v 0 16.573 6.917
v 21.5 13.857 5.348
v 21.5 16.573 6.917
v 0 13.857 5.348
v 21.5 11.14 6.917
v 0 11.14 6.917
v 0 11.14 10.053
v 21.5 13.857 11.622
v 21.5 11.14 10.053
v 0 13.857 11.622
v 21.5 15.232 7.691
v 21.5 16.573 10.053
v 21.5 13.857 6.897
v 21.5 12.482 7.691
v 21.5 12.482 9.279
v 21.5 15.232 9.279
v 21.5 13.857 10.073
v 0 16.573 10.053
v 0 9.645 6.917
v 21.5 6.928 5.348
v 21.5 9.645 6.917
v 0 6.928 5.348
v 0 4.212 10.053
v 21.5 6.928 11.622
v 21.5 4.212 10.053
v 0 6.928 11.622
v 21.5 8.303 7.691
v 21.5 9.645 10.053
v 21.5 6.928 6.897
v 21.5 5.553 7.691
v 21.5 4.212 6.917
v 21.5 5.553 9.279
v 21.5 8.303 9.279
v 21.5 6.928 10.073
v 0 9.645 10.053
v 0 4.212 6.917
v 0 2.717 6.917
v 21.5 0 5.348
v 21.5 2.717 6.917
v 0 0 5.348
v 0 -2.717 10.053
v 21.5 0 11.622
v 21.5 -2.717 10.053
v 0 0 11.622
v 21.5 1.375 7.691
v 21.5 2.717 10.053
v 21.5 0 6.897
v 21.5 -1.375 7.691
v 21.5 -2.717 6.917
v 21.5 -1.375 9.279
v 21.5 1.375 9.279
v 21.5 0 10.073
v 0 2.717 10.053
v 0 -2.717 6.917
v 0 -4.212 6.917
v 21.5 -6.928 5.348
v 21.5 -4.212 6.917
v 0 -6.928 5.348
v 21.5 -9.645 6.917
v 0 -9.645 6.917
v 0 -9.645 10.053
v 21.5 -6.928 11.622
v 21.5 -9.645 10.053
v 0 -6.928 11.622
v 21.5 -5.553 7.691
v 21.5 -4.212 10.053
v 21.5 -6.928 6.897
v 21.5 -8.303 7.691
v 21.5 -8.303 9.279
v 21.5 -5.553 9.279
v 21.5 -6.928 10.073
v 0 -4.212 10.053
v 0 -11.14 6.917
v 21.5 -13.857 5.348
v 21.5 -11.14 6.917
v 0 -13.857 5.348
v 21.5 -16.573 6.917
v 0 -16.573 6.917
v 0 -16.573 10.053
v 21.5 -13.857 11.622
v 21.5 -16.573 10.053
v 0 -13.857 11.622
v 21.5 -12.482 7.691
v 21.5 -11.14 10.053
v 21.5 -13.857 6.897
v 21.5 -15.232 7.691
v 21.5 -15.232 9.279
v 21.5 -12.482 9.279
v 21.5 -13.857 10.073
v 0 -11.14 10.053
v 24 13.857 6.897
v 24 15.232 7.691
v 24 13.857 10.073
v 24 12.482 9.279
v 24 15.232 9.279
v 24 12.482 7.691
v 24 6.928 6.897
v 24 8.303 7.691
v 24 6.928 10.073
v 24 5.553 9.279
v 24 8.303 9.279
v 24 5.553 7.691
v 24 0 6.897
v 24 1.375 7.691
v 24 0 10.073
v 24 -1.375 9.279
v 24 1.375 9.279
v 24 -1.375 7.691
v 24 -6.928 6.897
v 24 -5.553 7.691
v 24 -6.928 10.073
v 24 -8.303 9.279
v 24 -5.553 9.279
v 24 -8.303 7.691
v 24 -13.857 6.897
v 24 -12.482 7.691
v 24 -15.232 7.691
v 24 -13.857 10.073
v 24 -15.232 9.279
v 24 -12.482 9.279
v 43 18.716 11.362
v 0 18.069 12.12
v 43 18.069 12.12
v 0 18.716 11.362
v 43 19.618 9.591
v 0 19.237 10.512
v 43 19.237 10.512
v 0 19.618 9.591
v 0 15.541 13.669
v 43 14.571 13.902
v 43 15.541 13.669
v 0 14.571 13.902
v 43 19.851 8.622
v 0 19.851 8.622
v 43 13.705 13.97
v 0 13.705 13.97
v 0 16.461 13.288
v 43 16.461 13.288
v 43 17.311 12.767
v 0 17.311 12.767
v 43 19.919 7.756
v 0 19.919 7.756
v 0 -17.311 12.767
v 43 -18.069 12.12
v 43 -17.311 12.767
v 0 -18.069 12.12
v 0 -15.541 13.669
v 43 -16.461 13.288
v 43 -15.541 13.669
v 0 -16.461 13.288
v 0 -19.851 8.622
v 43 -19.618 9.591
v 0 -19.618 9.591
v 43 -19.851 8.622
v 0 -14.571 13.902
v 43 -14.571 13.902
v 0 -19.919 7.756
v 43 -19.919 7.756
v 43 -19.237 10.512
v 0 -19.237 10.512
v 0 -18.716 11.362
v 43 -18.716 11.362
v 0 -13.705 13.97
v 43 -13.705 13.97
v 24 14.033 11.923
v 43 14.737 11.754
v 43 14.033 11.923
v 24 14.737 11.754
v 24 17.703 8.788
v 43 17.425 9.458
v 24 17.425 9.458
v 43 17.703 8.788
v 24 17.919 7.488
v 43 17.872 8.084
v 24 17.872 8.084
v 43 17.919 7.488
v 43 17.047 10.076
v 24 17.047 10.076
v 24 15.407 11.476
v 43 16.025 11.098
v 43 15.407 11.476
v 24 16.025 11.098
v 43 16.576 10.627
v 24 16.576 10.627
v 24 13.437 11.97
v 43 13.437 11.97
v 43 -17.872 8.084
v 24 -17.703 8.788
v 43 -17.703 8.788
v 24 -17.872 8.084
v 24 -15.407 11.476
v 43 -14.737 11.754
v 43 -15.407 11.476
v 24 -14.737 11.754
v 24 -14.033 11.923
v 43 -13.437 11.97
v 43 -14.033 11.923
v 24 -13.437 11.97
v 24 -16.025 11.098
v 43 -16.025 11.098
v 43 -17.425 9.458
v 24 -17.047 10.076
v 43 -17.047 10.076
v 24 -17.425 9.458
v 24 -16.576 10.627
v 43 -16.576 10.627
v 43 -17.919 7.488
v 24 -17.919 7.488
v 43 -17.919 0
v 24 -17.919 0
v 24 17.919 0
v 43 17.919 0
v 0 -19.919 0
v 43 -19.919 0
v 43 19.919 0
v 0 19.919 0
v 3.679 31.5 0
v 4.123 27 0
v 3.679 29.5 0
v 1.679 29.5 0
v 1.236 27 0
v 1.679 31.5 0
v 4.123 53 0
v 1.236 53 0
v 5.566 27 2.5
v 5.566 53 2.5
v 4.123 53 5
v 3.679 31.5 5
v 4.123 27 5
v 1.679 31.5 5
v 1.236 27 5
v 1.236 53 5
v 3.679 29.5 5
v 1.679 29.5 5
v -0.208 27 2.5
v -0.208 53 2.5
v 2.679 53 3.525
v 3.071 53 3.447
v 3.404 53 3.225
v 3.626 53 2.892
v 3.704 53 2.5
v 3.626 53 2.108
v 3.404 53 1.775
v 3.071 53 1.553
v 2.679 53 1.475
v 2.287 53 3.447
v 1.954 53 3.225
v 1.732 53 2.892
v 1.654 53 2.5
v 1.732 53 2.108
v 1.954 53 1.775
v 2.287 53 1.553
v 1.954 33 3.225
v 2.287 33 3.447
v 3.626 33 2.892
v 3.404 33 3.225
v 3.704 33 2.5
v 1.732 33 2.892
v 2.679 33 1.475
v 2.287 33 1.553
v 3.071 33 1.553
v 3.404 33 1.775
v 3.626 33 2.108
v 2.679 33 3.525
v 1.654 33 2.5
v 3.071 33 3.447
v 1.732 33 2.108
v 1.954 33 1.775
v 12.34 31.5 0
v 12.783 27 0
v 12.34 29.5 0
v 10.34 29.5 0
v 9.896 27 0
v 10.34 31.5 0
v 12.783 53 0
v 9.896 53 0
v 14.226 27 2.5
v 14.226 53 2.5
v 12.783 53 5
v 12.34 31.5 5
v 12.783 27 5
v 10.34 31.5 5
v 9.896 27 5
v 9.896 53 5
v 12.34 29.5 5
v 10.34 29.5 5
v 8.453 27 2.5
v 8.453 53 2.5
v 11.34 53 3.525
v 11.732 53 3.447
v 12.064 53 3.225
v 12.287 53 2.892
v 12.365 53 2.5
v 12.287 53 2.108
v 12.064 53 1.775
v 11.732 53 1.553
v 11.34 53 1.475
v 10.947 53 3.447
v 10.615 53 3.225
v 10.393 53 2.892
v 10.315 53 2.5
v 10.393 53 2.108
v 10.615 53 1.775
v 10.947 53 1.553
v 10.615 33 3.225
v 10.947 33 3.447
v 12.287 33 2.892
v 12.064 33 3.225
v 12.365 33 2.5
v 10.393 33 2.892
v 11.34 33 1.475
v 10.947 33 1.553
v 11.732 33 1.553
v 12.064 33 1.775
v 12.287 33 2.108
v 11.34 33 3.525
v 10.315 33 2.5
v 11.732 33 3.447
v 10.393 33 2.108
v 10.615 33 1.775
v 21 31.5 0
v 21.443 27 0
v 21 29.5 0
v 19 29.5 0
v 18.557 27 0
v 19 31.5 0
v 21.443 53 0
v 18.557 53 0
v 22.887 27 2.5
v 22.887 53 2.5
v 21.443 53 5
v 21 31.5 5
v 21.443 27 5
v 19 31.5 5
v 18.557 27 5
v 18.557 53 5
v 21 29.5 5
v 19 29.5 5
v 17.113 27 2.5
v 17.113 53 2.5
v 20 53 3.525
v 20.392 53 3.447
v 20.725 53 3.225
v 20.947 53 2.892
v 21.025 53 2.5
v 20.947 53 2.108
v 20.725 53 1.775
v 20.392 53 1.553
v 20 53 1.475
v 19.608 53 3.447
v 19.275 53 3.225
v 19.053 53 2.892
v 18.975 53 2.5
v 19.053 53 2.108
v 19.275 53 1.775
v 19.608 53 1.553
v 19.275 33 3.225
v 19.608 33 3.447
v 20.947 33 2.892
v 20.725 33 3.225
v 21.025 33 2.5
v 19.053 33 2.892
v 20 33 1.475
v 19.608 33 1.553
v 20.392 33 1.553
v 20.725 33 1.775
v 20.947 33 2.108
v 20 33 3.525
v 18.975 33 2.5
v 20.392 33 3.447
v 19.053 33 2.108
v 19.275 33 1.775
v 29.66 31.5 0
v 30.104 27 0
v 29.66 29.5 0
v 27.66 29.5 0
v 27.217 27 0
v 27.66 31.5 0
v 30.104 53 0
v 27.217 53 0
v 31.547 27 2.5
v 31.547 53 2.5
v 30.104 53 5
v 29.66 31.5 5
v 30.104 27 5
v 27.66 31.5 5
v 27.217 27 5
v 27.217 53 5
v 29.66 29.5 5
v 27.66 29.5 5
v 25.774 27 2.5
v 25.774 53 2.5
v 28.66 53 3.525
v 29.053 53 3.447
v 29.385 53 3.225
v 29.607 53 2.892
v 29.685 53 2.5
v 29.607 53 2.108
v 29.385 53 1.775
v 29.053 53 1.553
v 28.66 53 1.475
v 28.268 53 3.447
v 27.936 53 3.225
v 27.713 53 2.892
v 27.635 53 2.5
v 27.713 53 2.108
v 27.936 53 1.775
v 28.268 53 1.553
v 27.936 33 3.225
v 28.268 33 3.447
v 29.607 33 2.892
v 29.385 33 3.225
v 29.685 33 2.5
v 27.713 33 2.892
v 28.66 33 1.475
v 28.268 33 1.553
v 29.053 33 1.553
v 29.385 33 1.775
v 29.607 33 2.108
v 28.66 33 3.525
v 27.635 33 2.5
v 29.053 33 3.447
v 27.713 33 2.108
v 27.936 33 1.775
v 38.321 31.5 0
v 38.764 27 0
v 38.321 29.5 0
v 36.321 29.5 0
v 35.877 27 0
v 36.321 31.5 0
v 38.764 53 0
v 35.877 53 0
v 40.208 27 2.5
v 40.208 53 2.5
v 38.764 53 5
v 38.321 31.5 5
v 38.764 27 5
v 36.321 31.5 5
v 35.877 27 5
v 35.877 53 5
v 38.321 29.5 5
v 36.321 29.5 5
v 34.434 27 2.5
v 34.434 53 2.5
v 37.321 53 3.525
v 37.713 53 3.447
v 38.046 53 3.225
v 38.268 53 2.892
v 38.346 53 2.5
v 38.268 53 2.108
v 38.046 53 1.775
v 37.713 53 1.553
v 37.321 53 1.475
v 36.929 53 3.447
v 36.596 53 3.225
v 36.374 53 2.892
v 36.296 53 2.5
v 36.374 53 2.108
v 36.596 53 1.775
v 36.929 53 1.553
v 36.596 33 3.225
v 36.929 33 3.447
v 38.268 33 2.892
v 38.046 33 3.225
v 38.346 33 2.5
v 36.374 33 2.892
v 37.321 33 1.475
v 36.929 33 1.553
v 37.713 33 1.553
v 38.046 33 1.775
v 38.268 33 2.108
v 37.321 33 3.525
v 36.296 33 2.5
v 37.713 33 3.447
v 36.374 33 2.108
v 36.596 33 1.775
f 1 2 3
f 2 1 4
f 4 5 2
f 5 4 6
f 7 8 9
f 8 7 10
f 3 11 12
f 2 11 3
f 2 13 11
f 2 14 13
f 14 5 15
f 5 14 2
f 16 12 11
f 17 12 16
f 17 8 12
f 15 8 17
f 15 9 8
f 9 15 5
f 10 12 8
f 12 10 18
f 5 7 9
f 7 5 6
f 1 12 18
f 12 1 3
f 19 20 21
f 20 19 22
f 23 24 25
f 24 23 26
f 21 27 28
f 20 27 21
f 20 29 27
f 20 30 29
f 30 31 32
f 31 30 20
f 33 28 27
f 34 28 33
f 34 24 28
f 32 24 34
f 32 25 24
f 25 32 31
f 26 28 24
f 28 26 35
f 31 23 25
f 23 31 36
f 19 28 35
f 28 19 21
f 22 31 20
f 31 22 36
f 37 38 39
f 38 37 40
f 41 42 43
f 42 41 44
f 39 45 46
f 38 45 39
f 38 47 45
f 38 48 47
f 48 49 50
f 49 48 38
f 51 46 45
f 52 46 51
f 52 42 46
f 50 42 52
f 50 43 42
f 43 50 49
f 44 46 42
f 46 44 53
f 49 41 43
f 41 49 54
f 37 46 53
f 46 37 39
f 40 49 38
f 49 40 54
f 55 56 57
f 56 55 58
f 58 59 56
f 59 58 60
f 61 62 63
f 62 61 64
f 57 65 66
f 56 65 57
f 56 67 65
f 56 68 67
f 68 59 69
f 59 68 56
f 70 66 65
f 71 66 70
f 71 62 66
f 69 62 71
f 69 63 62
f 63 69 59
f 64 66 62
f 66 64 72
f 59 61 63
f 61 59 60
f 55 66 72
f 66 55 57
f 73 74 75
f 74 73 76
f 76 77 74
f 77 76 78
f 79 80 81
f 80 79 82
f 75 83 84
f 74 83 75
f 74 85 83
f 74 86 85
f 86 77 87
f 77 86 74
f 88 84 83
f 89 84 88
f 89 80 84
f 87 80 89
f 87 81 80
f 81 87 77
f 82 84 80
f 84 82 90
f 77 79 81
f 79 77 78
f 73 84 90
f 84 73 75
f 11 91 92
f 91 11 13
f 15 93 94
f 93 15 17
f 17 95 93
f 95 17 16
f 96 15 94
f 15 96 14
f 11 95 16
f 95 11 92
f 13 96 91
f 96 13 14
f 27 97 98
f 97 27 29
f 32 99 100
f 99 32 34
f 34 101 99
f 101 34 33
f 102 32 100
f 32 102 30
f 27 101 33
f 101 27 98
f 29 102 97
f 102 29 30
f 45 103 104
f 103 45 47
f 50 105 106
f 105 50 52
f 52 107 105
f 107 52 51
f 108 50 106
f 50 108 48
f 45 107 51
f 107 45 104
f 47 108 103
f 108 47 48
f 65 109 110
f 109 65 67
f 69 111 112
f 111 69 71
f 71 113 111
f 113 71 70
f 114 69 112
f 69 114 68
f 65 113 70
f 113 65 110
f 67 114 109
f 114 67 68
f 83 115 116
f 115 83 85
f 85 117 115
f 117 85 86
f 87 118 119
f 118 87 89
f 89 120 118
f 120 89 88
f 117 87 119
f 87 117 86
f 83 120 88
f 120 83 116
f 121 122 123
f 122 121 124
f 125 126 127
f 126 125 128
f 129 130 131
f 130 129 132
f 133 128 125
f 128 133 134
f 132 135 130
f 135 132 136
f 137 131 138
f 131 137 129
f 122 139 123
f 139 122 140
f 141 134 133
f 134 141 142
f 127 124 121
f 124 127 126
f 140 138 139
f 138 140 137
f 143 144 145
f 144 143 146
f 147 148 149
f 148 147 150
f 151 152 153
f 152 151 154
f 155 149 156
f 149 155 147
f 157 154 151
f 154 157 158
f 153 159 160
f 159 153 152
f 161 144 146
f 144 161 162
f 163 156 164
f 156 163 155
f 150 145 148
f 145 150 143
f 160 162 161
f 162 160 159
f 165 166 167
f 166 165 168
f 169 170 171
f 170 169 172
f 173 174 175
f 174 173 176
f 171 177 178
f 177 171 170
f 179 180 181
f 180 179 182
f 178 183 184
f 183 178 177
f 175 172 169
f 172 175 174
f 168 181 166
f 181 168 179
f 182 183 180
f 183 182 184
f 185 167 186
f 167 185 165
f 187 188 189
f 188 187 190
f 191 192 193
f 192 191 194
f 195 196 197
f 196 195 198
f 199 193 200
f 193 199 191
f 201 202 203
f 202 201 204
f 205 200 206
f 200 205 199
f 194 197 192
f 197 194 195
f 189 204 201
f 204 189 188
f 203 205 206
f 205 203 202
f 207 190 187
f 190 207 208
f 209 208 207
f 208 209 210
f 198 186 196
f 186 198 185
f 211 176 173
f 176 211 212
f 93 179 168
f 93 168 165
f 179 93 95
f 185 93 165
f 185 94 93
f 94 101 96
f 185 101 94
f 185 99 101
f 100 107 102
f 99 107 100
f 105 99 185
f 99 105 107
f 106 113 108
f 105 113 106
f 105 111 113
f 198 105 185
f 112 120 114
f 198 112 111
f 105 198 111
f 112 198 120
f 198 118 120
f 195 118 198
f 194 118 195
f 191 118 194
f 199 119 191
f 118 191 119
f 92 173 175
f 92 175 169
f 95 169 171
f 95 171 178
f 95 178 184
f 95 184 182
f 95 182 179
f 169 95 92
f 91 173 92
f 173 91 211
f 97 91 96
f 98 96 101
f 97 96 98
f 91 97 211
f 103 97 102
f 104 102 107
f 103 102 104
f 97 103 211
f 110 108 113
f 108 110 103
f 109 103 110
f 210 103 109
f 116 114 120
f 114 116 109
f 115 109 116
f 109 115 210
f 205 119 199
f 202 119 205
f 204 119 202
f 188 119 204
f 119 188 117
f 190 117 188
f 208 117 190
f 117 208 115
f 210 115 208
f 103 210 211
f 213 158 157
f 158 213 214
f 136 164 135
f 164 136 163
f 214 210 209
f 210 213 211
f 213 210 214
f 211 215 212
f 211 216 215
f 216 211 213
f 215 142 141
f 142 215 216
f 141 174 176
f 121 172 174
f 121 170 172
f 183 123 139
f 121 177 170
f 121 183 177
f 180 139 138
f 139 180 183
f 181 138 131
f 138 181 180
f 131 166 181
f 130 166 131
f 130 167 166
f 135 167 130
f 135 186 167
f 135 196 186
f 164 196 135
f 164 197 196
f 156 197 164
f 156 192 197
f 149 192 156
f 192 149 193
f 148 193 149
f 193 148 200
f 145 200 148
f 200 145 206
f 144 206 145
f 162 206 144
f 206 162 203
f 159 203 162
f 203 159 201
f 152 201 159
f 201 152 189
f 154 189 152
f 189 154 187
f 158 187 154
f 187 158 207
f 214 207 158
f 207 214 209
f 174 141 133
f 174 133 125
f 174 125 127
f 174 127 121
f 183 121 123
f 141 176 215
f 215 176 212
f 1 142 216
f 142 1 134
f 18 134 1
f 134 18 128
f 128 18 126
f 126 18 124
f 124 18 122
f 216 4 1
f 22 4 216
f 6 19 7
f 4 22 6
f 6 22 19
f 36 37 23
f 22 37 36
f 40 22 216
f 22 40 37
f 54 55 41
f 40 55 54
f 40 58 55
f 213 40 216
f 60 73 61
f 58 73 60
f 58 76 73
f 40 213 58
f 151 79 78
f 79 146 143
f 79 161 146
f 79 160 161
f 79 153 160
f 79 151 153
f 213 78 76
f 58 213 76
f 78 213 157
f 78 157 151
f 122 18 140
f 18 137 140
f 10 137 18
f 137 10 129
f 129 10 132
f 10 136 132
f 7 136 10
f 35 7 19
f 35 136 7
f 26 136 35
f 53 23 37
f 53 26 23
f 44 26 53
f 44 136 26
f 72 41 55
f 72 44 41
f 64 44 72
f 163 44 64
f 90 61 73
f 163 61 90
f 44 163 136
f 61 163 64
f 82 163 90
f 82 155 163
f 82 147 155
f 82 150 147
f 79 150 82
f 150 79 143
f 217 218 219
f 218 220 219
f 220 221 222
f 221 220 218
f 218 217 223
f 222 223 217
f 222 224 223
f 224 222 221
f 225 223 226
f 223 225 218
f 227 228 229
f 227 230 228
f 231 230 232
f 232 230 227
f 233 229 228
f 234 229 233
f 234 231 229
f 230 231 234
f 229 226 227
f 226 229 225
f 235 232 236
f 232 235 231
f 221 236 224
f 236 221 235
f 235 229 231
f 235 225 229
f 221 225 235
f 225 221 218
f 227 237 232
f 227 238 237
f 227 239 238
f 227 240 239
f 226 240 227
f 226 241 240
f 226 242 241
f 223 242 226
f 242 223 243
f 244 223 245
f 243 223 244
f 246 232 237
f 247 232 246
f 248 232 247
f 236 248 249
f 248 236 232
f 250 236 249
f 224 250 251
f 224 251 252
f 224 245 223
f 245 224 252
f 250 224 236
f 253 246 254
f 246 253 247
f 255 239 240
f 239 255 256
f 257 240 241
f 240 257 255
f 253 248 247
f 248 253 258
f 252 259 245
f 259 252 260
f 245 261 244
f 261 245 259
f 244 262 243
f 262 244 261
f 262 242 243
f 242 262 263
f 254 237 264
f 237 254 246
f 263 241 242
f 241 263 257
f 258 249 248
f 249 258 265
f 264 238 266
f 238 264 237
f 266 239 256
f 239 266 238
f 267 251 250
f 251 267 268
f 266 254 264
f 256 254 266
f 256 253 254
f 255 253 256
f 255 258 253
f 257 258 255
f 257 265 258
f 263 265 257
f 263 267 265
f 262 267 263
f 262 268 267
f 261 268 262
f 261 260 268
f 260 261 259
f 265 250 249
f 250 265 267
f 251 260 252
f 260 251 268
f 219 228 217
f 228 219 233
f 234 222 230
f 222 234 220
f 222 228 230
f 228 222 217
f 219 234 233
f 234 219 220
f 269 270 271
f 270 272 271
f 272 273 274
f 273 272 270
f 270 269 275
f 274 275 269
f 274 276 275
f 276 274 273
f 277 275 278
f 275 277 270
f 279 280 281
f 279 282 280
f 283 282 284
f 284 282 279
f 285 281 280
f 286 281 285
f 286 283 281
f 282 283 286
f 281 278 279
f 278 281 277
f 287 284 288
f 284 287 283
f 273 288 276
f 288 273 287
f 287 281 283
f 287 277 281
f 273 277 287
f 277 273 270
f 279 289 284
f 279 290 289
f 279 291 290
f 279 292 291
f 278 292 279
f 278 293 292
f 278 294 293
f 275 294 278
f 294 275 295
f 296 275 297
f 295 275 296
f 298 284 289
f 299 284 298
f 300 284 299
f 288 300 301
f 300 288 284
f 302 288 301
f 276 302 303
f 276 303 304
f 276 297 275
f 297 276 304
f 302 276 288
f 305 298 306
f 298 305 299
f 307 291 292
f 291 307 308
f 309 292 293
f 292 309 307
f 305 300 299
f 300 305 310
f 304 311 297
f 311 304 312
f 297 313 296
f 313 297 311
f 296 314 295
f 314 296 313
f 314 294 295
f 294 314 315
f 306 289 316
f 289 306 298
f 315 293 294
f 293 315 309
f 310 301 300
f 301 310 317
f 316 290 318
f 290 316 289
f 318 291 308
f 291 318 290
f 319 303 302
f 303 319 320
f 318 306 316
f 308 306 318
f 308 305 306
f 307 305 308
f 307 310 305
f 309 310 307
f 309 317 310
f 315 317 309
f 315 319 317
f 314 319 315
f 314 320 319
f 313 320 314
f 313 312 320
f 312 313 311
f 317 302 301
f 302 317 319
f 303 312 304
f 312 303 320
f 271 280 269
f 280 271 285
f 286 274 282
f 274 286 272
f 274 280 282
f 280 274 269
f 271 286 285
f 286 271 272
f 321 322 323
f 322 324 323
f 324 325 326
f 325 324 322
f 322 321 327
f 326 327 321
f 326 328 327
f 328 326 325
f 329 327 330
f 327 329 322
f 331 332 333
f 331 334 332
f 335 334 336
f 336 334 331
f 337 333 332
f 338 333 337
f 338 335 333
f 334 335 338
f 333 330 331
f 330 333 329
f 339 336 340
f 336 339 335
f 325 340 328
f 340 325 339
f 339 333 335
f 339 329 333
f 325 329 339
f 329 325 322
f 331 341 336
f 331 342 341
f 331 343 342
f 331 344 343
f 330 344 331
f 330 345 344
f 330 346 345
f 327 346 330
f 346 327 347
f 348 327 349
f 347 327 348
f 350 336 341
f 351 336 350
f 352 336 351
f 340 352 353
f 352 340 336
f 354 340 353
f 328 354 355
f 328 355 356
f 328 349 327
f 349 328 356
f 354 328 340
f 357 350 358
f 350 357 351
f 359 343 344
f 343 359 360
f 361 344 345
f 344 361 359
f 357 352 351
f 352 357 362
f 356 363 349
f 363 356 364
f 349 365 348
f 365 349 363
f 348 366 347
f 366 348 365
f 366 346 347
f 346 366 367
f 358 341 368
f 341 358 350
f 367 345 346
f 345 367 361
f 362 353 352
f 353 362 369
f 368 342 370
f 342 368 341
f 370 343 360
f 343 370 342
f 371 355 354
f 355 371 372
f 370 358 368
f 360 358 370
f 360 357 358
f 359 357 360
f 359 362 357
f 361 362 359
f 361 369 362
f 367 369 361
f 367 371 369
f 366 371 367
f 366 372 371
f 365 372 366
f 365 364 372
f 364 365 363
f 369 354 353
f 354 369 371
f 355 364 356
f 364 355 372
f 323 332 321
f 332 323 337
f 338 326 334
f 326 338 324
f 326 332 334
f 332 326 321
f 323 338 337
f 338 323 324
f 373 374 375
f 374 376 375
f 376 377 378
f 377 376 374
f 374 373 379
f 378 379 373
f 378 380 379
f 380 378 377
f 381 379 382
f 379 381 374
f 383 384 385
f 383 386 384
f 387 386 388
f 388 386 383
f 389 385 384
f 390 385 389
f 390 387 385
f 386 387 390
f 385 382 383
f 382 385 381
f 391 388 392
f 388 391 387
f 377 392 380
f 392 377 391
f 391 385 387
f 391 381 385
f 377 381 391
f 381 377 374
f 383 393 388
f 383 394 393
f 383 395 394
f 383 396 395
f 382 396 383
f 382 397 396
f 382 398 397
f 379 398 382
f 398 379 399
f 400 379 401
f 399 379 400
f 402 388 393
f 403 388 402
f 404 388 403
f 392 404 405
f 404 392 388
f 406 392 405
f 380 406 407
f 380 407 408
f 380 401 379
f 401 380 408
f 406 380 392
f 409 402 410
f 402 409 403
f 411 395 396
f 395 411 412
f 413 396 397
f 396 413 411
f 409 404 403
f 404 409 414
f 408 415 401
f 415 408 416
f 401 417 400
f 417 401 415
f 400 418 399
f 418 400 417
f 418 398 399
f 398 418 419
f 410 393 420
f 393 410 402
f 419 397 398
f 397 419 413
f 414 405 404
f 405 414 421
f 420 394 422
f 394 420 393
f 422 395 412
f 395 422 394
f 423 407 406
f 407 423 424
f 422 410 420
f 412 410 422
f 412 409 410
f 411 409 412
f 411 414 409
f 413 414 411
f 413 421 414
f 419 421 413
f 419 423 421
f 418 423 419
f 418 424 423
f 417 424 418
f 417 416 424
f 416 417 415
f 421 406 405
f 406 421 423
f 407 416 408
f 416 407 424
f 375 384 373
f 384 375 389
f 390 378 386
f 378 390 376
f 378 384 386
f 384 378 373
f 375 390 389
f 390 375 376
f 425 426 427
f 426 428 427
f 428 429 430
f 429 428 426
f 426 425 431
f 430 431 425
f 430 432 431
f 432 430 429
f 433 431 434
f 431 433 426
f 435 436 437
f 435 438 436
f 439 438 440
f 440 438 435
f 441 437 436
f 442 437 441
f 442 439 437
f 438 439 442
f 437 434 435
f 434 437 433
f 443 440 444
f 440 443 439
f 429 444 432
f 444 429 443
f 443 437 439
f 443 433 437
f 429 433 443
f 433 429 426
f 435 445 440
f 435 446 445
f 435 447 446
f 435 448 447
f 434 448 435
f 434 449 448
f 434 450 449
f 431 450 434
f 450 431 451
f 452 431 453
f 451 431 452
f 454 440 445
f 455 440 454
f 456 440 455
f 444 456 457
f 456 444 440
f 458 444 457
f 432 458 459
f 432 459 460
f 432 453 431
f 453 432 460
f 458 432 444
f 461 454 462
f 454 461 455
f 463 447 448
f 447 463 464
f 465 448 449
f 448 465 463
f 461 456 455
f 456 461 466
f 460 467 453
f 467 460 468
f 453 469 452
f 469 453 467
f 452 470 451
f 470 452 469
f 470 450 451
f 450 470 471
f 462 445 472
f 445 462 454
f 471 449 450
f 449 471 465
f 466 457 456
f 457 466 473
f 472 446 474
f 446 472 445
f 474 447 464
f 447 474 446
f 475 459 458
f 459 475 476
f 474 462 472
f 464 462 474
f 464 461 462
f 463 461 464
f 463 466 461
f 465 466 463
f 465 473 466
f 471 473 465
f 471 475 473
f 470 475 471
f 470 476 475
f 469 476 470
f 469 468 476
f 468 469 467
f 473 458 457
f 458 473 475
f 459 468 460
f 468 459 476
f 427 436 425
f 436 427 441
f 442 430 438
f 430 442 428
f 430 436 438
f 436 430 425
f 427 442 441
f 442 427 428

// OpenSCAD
/*

Parametric Prosthetic Hand String Tensioner
Based on a part designed by Ivan Owen
Put into parametric format by David Orgeman

Released under the terms of the GNU GPL v3.0 

This program is free software: you can redistribute it and/or modify
it under the terms of the GNU General Public License as published by
the Free Software Foundation, either version 3 of the License, or
(at your option) any later version.

This program is distributed in the hope that it will be useful,
but WITHOUT ANY WARRANTY; without even the implied warranty of
MERCHANTABILITY or FITNESS FOR A PARTICULAR PURPOSE. See the
GNU General Public License for more details.

You should have received a copy of the GNU General Public License
along with this program. If not, see <http://www.gnu.org/licenses/>.

*/


Metric_Table=[ 	["M2", 0.8000, 1.1000, 2.3094], 
				["M25", 1.0250, 1.3750, 2.8868], 
				["M3", 1.2500, 1.6500, 3.1754], 
				["M4", 1.6500, 2.2000, 4.0415], 
				["M5", 2.1000, 2.7500, 4.6188]  ];


//Standard hole sizes for tapping into plastic
//M2T=1.60;
//M25T=2.05;
//M3T=2.5;
//M4T=3.3;
//M5T=4.2;

//Standard hole sizes for metric screws
//M2=2.2;
//M25=2.75;
//M3=3.3;
//M4=4.4;
//M5=5.5;

//Standard nut sizes - flat-to-flat and then as radius
//M2NutW=4.0;
//M25NutW=5.0;
//M3NutW=5.5;
//M4NutW=7.0;
//M5NutW=8.0;
//M2NutR=(M2NutW/cos(30))/2;
//M25NutR=(M25NutW/cos(30))/2;
//M3NutR=(M3NutW/cos(30))/2;
//M4NutR=(M4NutW/cos(30))/2;
//M5NutR=(M5NutW/cos(30))/2;


//PARAMETERS

//size of the tuner drive screws
Tuner_Size="M25";//[ M2, M25, M3, M4, M5 ]

Metric_Index=search([Tuner_Size], Metric_Table)[0];
Tuner_Screw_Radius=Metric_Table[Metric_Index][1];
Block_Screw_Radius=Metric_Table[Metric_Index][2];
Rod_Radius=Metric_Table[Metric_Index][3];

//extra elevation of the tuners and strings above the gauntlet
Extra_Tuner_Height=0.0;

//slightly increase the length of rods and tuner block for springs
Spring_Length_Adjustment=3.0;

//length of the spring covering shell on the back of the tuner
Spring_Shield_Adjustment=19.0;

//functional length of the tuner rods
Rod_Length=18.0;

//extra tuner rod length to tie the strings to.
Extra_Tuner_Length=5.0;

//size of the hole through the tuners for the drive strings
String_Radius=1.0;

//number of tuners - most will want 5, some might want 4
Tuner_Count=5;//[1, 2, 3, 4, 5]

//extra gap in the tuner slots to allow them to slide more readily
Tuner_Fit=0.25;


//0 to print tuners, 1 to omit them
Print_Tuners=0;//[0, 1]

//0 to print the block, 1 to omit it
Print_Block=0;//[0, 1]


//RENDER
if (Print_Block == 0)
	{
	translate([0, 0, 3])
		block();
	}
	

if (Print_Tuners == 0)
	{
	if (Tuner_Count>0)
		{
		for(i=[1:Tuner_Count])
			{
			translate([20-3*Rod_Radius*(Tuner_Count+1)/2 + 3*Rod_Radius*i, 40, 0])
				tuner();
			}
		}
	}


module block()
	{
	rotate(a=[0, 0, -90])
	difference()
		{
		translate([-2.3*Rod_Radius*(Tuner_Count+1)/2, 0, -3])
			cube([4.6*Rod_Radius*(Tuner_Count+1)/2, Rod_Length+3+Spring_Length_Adjustment+Spring_Shield_Adjustment, 3.8*Rod_Radius+Extra_Tuner_Height+3]);
									
		for(i=[1:Tuner_Count])
			{
			translate([-2.4*Rod_Radius*(Tuner_Count+1)/2 + 2.4*Rod_Radius*i, Rod_Length+0.5+Spring_Length_Adjustment, 1.9*Rod_Radius+Extra_Tuner_Height])
				rotate(a=[0, 30, 0])
				rotate(a=[90, 0, 0])
					cylinder(h=Rod_Length+2+Spring_Length_Adjustment, r=Rod_Radius+Tuner_Fit, $fn=6);
			}

		for(i=[1:Tuner_Count])
			{
			translate([-2.4*Rod_Radius*(Tuner_Count+1)/2 + 2.4*Rod_Radius*i, 50, 1.9*Rod_Radius+Extra_Tuner_Height])
				rotate(a=[0, 30, 0])
				rotate(a=[90, 0, 0])
					cylinder(h=100, r=Block_Screw_Radius/cos(30), $fn=6);
			}
		
		translate([-2.3*Rod_Radius*(Tuner_Count+1)/2-0.01, 0, 3.8*Rod_Radius+Extra_Tuner_Height+0.01])
			rotate(a=[-90, 0, 0])
				fillet(r=2.2*Rod_Radius, h=200);
		translate([2.3*Rod_Radius*(Tuner_Count+1)/2+0.01, 0, 3.8*Rod_Radius+Extra_Tuner_Height+0.01])
			rotate(a=[0, 90, 0])
			rotate(a=[-90, 0, 0])
				fillet(r=2.2*Rod_Radius, h=200);

		difference()
			{
			translate([-2.3*Rod_Radius*(Tuner_Count+1)/2+2, Rod_Length+3+Spring_Length_Adjustment, -6])
				cube([4.6*Rod_Radius*(Tuner_Count+1)/2-4, Spring_Shield_Adjustment+2, 3.8*Rod_Radius+Extra_Tuner_Height+6-2]);
			translate([-2.3*Rod_Radius*(Tuner_Count+1)/2+2-0.01, 0, 3.8*Rod_Radius+Extra_Tuner_Height-2+0.01])
				rotate(a=[-90, 0, 0])
					fillet(r=1.6*Rod_Radius, h=200);
			translate([2.3*Rod_Radius*(Tuner_Count+1)/2-2+0.01, 0, 3.8*Rod_Radius+Extra_Tuner_Height-2+0.01])
				rotate(a=[0, 90, 0])
				rotate(a=[-90, 0, 0])
					fillet(r=1.6*Rod_Radius, h=200);
			}

		}	
	}	
	
	
module tuner()
	{
	translate([0, (Rod_Length+Extra_Tuner_Length+Spring_Length_Adjustment)/2, Rod_Radius*cos(30)])
	difference()
		{
		rotate(a=[90, 0, 0])
			cylinder(h=Rod_Length+Extra_Tuner_Length+Spring_Length_Adjustment, r=Rod_Radius, $fn=6);
		translate([0, 1, 0])
			rotate(a=[90, 0, 0])
				cylinder(h=Rod_Length+Spring_Length_Adjustment, r=Tuner_Screw_Radius, $fn=16);
		translate([-String_Radius, -Rod_Length-Spring_Length_Adjustment-Extra_Tuner_Length/2, -10])
//			polyhole(h=20, d=String_Radius*2);
//			cylinder(h=20, r=String_Radius, center=true);
			cube([2*String_Radius, 2*String_Radius, 20]);
		}
	}


	
module fillet(r, h) 
	{
	translate([r/2, r/2, 0])
		difference() 
			{
			cube([r, r, h], center=true);
			translate([r/2, r/2, 0])
				cylinder(h=h+1, r=r, center=true, $fn=40);
			}
	}

	
	
// By nophead
module polyhole(d, h) 
	{
	n=max(round(2*d), 3);
	rotate(v=[0, 0, 180])
		cylinder(h=h, r=(d/2)/cos(180/n), center=true, $fn=n);
	}

